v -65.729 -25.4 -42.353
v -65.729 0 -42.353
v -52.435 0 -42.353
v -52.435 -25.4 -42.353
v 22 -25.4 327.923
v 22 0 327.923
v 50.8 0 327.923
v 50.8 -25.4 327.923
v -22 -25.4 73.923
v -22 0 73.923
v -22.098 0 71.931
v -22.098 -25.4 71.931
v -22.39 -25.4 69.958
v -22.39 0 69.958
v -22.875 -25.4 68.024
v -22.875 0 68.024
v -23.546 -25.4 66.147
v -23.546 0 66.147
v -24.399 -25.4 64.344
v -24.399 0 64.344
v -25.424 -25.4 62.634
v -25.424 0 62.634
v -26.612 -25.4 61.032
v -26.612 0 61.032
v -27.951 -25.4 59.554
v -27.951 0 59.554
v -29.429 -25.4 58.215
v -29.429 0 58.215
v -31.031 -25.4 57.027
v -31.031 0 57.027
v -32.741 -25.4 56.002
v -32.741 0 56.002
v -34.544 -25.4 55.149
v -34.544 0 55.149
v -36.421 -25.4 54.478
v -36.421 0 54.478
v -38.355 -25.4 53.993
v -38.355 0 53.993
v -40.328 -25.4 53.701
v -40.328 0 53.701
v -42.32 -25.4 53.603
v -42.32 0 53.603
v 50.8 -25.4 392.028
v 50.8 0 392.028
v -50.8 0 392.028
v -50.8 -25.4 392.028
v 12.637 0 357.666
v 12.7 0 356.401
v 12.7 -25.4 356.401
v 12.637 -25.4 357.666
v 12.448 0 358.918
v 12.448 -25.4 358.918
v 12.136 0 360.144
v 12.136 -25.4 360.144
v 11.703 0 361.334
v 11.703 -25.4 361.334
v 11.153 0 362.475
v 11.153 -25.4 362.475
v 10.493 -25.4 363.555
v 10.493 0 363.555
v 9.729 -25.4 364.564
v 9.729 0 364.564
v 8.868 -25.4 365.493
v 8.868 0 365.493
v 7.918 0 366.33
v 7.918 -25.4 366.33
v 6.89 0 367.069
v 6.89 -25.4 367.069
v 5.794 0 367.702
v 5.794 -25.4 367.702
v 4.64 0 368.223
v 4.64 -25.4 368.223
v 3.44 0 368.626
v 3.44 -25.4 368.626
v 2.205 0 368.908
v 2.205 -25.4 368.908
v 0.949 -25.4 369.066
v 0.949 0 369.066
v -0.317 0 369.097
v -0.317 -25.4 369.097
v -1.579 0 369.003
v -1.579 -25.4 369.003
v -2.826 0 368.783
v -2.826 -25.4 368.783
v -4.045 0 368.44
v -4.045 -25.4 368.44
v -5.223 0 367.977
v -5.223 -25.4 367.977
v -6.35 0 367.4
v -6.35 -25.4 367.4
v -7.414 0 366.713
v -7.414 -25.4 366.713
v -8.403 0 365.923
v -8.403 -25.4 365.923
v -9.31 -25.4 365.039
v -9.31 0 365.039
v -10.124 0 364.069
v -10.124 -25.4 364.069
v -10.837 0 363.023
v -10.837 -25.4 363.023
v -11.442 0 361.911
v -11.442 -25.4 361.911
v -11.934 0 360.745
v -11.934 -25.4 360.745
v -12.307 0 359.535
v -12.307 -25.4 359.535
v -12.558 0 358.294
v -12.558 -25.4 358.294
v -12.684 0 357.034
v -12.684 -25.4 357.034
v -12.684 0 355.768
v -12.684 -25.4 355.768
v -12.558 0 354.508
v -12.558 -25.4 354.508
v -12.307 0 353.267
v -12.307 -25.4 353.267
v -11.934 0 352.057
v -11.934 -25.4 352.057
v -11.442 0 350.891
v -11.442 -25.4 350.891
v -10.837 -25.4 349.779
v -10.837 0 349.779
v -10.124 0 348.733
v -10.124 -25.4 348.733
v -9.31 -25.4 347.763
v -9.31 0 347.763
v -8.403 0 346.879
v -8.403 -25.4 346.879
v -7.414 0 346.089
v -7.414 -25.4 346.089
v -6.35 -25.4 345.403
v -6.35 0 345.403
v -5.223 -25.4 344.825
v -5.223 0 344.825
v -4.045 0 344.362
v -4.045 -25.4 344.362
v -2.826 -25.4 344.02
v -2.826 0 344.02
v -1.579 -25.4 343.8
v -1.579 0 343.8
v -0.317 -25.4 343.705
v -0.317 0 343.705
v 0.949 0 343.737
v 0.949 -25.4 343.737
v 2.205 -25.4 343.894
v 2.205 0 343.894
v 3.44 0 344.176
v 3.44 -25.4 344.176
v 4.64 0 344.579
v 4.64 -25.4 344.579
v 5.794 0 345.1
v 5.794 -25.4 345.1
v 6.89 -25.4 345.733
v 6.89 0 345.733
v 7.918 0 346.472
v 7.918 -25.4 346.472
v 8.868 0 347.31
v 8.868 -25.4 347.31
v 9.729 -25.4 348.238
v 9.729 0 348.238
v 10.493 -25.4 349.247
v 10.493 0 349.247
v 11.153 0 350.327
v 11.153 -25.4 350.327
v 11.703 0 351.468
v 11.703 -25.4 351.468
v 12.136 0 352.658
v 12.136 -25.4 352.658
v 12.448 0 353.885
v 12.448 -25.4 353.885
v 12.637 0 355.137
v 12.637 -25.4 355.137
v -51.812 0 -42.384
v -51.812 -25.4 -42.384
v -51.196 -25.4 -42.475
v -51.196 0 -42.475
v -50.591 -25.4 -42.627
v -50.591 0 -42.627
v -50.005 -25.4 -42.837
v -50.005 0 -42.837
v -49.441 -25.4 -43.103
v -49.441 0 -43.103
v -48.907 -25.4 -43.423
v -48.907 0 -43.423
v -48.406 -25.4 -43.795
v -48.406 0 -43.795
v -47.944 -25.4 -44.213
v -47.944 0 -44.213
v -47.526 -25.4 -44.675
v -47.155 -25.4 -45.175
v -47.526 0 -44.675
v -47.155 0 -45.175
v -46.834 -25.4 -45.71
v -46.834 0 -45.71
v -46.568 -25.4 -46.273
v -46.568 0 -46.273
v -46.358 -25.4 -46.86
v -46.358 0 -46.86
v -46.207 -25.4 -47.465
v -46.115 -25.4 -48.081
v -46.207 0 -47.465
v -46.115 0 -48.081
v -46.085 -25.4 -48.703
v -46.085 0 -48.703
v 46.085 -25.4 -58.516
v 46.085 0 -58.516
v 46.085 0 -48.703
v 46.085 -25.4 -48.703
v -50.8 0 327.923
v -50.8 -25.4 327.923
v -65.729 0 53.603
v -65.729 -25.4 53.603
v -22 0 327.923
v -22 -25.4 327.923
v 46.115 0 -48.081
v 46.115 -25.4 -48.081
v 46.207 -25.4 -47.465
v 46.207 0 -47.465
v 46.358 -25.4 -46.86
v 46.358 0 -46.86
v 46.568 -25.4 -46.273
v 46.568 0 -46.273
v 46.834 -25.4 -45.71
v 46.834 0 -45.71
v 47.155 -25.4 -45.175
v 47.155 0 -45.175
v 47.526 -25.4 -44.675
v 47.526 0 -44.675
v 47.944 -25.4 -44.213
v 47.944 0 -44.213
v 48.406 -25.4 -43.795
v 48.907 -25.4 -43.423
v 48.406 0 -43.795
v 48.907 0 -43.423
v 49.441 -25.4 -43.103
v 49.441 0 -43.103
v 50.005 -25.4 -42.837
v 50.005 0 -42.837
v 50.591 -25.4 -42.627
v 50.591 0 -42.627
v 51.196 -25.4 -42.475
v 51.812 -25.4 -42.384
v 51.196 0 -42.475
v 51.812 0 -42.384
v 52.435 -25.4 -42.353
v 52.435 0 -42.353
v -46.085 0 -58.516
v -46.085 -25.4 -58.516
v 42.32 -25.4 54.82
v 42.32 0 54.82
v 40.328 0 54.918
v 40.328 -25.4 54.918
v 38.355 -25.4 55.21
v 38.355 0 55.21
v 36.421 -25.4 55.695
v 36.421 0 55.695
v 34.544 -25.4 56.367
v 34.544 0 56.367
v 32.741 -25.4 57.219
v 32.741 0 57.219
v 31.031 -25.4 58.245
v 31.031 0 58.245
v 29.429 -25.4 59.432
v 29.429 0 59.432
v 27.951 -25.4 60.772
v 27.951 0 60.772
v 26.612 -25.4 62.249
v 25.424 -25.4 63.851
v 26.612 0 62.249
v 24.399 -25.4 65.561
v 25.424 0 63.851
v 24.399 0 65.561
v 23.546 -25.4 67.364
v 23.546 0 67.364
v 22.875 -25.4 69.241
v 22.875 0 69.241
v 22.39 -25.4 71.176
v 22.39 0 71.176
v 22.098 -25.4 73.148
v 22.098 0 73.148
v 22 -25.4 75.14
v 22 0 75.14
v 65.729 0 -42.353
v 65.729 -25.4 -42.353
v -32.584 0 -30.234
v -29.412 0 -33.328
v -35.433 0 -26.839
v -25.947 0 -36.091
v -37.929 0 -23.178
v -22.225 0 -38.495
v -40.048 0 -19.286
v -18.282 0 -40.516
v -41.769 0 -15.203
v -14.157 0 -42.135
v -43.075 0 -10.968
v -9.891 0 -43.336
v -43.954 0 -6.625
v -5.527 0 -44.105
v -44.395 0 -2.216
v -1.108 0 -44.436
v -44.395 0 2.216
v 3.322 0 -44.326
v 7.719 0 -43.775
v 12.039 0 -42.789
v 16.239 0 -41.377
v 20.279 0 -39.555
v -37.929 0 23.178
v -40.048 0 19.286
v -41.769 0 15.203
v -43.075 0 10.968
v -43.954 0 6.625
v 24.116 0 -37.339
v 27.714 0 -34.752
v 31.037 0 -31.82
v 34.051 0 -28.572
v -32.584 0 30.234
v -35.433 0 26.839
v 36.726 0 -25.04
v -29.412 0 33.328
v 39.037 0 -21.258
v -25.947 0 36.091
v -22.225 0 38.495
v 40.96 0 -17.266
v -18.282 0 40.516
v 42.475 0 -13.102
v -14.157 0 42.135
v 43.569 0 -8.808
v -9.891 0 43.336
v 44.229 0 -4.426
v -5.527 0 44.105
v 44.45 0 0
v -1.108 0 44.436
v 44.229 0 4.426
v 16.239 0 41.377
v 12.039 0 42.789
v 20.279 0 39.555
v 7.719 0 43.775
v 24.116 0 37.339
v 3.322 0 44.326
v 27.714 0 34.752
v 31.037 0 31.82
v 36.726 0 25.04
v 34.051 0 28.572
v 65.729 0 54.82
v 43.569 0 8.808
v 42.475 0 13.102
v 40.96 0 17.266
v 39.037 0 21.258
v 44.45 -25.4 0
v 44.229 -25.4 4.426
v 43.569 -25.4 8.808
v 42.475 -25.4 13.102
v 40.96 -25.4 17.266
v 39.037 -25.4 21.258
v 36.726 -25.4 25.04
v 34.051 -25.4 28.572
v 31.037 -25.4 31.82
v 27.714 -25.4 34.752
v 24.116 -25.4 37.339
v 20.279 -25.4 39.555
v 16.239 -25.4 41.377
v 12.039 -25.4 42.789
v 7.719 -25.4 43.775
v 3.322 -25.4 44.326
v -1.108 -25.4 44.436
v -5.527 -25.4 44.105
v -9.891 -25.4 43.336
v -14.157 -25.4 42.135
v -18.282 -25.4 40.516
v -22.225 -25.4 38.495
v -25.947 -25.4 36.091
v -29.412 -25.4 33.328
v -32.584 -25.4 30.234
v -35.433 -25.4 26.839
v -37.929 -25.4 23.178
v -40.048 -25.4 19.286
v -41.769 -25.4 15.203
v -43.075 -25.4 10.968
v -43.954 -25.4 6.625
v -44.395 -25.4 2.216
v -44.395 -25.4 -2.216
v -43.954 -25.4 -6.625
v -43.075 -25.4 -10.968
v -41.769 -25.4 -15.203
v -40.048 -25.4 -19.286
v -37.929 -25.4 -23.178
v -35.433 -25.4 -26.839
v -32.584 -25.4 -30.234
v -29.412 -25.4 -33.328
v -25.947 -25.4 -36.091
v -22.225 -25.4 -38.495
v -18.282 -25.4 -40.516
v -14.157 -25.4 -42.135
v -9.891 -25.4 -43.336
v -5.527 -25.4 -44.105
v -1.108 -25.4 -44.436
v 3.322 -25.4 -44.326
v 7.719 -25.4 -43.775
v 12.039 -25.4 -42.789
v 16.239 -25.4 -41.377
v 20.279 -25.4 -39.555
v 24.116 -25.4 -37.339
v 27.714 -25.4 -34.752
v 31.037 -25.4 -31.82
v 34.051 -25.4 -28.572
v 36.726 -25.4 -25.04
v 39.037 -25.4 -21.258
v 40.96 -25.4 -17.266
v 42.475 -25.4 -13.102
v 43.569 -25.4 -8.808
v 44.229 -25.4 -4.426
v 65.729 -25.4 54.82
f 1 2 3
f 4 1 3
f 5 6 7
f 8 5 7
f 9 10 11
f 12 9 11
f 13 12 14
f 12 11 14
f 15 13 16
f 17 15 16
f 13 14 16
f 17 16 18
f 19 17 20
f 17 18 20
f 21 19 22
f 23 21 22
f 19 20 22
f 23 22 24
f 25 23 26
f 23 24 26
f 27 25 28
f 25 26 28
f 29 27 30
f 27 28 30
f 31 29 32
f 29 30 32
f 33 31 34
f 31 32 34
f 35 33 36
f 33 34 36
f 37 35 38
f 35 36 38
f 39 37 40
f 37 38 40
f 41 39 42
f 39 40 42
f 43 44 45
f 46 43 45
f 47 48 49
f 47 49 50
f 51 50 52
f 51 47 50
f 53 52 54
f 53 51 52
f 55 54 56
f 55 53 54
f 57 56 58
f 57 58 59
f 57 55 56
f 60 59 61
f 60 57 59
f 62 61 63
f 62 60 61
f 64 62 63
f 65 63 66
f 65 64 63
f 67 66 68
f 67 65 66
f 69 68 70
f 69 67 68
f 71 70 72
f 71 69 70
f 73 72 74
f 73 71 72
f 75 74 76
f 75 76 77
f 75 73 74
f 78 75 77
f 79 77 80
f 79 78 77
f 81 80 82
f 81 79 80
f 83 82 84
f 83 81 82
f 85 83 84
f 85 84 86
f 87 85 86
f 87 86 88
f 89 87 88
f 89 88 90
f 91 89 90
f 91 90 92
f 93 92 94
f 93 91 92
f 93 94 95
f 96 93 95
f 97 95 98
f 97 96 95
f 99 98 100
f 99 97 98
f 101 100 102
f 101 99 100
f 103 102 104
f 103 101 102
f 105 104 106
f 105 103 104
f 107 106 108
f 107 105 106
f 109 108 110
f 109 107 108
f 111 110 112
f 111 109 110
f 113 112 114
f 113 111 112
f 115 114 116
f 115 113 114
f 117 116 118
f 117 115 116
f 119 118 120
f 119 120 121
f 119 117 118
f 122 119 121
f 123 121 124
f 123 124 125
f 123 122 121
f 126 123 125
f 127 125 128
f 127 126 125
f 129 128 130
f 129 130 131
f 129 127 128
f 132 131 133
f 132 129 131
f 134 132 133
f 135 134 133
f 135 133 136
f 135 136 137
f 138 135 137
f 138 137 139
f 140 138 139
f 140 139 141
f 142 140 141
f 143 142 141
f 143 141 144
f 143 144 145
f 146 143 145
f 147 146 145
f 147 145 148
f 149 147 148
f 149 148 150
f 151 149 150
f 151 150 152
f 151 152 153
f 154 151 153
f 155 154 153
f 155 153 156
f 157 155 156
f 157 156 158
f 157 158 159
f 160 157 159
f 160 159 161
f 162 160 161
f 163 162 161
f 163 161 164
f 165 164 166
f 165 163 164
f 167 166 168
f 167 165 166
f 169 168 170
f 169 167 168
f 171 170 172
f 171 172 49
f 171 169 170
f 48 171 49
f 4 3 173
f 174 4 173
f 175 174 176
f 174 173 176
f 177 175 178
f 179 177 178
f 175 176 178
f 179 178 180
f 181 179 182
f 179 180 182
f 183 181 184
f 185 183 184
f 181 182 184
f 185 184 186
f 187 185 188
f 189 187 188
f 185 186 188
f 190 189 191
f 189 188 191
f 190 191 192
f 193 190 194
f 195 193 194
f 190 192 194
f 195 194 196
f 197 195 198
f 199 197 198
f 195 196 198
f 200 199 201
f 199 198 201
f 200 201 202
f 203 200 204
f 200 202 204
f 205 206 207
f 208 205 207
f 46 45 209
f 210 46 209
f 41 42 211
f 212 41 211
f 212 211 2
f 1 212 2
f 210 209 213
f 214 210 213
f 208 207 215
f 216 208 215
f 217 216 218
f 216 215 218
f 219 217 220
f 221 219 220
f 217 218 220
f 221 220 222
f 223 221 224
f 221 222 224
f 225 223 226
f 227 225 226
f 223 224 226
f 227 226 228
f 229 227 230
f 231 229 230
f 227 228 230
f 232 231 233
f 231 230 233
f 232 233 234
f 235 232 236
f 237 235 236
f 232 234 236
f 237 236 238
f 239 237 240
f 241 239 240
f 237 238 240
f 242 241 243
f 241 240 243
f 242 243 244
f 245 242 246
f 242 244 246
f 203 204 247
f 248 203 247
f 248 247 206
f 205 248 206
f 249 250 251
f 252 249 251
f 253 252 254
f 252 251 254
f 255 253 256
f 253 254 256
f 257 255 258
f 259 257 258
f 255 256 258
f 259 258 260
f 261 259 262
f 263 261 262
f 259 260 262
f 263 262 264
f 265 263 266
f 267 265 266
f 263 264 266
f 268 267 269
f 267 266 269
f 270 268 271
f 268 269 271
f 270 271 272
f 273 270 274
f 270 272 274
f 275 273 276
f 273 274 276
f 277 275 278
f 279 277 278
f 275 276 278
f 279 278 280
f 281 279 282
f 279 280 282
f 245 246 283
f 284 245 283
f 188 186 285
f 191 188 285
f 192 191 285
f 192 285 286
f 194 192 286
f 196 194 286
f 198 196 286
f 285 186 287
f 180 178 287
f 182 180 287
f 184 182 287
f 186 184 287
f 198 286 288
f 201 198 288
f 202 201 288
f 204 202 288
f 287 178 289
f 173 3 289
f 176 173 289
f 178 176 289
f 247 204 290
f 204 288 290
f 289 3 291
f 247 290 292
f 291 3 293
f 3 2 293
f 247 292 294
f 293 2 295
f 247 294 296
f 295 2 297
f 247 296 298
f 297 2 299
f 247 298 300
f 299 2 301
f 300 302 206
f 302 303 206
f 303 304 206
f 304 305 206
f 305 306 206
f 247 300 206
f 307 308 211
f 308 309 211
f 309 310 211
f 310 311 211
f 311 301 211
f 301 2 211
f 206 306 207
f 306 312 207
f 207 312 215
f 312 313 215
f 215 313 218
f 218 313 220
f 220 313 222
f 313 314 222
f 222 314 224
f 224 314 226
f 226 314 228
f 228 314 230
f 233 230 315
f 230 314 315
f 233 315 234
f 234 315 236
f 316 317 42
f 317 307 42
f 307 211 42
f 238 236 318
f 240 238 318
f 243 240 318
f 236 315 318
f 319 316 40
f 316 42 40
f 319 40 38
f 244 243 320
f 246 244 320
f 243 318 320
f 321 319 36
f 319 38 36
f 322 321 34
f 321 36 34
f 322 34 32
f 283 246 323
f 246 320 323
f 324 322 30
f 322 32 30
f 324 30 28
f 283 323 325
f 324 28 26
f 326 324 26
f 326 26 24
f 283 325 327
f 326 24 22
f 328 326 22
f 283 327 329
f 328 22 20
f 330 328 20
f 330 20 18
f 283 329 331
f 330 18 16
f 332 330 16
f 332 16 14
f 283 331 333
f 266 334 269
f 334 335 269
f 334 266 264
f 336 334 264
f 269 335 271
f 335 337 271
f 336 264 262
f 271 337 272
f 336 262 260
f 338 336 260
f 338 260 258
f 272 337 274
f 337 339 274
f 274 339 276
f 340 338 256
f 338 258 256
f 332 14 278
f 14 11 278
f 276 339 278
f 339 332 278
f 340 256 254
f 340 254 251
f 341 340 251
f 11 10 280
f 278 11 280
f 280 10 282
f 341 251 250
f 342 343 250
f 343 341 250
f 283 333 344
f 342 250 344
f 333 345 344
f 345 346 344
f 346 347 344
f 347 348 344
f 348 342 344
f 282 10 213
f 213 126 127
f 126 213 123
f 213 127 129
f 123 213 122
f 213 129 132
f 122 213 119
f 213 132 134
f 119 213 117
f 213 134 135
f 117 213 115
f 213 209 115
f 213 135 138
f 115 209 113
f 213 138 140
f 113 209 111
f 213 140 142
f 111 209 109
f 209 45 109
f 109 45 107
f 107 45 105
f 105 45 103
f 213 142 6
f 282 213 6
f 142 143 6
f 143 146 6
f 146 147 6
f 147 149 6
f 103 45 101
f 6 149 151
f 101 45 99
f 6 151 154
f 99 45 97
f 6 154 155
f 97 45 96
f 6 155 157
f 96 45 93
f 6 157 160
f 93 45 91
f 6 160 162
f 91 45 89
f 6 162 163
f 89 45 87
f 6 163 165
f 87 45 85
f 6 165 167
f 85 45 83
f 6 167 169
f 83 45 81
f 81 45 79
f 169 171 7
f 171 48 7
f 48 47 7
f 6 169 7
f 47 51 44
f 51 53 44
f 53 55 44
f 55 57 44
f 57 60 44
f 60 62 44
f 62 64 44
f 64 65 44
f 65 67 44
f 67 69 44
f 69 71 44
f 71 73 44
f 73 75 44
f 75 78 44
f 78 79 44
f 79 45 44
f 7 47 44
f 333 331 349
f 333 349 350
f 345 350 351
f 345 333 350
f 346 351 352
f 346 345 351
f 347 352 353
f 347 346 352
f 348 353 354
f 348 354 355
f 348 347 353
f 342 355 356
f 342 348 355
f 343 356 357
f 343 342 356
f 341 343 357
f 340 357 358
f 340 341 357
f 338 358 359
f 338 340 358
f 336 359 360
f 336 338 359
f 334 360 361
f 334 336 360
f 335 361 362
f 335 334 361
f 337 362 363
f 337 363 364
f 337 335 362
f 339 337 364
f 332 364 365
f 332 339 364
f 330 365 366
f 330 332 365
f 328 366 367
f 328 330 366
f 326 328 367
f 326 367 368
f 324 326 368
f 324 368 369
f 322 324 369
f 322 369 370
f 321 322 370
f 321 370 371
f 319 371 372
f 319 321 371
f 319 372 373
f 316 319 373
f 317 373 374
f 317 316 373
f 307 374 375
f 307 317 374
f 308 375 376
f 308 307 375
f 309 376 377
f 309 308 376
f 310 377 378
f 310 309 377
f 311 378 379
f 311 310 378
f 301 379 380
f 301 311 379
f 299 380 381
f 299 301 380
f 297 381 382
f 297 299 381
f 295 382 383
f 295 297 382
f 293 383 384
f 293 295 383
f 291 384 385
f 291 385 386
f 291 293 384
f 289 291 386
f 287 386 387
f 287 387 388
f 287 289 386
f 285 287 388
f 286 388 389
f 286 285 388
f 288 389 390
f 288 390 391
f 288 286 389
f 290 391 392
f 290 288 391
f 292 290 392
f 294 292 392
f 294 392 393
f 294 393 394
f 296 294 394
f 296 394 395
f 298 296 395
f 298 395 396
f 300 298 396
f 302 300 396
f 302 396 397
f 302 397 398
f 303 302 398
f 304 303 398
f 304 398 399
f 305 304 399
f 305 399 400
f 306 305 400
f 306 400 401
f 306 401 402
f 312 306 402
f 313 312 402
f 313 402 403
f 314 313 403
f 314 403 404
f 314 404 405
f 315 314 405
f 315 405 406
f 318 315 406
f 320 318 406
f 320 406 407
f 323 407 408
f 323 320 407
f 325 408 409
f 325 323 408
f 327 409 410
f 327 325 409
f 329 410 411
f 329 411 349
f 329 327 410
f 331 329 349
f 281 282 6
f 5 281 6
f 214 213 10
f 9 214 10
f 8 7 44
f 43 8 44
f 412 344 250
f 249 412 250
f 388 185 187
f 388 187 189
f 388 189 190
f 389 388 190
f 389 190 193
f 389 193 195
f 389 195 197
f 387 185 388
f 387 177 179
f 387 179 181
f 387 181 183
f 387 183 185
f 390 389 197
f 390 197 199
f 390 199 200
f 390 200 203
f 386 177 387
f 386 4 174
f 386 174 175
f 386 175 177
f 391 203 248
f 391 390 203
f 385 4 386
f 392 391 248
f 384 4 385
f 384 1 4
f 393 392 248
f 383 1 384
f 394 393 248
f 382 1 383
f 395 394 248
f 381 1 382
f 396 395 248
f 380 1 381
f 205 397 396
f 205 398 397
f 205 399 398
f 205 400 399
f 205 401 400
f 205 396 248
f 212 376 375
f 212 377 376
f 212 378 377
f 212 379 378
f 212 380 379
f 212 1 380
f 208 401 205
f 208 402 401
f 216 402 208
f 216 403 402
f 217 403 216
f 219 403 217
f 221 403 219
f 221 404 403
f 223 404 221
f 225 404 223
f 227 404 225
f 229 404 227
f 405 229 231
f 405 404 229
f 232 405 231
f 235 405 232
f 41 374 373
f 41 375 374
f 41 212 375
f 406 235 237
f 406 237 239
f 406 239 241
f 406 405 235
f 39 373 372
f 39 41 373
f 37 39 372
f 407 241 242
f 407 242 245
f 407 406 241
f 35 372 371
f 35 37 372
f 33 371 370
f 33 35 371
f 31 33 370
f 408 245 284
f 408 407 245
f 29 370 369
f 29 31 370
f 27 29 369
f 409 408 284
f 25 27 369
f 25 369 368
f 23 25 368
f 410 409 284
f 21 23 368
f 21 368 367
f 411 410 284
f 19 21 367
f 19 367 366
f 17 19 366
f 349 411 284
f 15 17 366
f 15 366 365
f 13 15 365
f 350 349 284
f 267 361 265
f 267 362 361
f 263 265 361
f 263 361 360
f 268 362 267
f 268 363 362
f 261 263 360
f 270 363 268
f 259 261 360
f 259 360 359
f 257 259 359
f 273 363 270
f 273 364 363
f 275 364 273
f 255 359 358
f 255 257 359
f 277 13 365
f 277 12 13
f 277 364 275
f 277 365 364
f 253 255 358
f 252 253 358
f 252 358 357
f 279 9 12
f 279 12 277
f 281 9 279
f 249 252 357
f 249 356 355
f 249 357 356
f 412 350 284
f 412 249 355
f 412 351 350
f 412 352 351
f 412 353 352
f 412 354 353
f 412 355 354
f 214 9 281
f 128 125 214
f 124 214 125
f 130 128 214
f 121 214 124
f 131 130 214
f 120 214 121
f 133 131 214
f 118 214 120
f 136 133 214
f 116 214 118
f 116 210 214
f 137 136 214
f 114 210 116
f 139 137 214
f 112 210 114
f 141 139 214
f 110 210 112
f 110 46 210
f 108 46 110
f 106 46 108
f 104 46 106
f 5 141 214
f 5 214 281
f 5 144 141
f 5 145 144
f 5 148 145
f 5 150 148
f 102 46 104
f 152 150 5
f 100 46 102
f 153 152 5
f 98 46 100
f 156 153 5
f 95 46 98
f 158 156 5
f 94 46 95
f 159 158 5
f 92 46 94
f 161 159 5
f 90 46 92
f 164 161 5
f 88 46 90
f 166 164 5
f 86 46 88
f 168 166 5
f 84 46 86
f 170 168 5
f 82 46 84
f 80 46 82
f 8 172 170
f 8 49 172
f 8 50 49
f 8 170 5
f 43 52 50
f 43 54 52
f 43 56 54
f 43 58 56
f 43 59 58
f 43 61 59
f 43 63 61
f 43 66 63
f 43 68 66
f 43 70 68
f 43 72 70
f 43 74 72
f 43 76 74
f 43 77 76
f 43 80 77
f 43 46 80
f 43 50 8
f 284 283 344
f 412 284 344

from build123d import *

# Parameters (mm, degrees)
F0_R     = 44.45
F0_R_2   = 12.7
F1_DEPTH = 25.4


with BuildPart() as f1:
    # F0 (on Front) → F1 (new body)
    with BuildSketch(Plane.XZ):
        with BuildLine():
            Line((-46.08459, -48.703328), (-46.08459, -58.516014))
            Line((-46.08459, -58.516014), (46.08459, -58.516014))
            Line((46.08459, -58.516014), (46.08459, -48.703328))
            ThreePointArc((46.08459, -48.703328), (47.944462, -44.2132), (52.43459, -42.353328))
            Line((52.43459, -42.353328), (65.728895, -42.353328))
            Line((65.728895, -42.353328), (65.728895, 54.819994))
            Line((65.728895, 54.819994), (42.319705, 54.819994))
            ThreePointArc((42.319705, 54.819994), (27.951295, 60.771584), (21.999705, 75.139994))
            Line((21.999705, 75.139994), (21.999705, 327.922707))
            Line((21.999705, 327.922707), (50.8, 327.922707))
            Line((50.8, 327.922707), (50.8, 392.02783))
            Line((50.8, 392.02783), (-50.8, 392.02783))
            Line((-50.8, 392.02783), (-50.8, 327.922707))
            Line((-50.8, 327.922707), (-21.999705, 327.922707))
            Line((-21.999705, 327.922707), (-21.999705, 321.452414))
            Line((-21.999705, 321.452414), (-21.999705, 73.922707))
            ThreePointArc((-21.999705, 73.922707), (-27.951295, 59.554297), (-42.319705, 53.602707))
            Line((-42.319705, 53.602707), (-65.728895, 53.602707))
            Line((-65.728895, 53.602707), (-65.728895, -42.353328))
            Line((-65.728895, -42.353328), (-52.43459, -42.353328))
            ThreePointArc((-52.43459, -42.353328), (-47.944462, -44.2132), (-46.08459, -48.703328))
        make_face()
        Circle(F0_R, mode=Mode.SUBTRACT)
        with Locations((0, 356.401086)):
            Circle(F0_R_2, mode=Mode.SUBTRACT)
    extrude(amount=F1_DEPTH)


solid = f1.part
